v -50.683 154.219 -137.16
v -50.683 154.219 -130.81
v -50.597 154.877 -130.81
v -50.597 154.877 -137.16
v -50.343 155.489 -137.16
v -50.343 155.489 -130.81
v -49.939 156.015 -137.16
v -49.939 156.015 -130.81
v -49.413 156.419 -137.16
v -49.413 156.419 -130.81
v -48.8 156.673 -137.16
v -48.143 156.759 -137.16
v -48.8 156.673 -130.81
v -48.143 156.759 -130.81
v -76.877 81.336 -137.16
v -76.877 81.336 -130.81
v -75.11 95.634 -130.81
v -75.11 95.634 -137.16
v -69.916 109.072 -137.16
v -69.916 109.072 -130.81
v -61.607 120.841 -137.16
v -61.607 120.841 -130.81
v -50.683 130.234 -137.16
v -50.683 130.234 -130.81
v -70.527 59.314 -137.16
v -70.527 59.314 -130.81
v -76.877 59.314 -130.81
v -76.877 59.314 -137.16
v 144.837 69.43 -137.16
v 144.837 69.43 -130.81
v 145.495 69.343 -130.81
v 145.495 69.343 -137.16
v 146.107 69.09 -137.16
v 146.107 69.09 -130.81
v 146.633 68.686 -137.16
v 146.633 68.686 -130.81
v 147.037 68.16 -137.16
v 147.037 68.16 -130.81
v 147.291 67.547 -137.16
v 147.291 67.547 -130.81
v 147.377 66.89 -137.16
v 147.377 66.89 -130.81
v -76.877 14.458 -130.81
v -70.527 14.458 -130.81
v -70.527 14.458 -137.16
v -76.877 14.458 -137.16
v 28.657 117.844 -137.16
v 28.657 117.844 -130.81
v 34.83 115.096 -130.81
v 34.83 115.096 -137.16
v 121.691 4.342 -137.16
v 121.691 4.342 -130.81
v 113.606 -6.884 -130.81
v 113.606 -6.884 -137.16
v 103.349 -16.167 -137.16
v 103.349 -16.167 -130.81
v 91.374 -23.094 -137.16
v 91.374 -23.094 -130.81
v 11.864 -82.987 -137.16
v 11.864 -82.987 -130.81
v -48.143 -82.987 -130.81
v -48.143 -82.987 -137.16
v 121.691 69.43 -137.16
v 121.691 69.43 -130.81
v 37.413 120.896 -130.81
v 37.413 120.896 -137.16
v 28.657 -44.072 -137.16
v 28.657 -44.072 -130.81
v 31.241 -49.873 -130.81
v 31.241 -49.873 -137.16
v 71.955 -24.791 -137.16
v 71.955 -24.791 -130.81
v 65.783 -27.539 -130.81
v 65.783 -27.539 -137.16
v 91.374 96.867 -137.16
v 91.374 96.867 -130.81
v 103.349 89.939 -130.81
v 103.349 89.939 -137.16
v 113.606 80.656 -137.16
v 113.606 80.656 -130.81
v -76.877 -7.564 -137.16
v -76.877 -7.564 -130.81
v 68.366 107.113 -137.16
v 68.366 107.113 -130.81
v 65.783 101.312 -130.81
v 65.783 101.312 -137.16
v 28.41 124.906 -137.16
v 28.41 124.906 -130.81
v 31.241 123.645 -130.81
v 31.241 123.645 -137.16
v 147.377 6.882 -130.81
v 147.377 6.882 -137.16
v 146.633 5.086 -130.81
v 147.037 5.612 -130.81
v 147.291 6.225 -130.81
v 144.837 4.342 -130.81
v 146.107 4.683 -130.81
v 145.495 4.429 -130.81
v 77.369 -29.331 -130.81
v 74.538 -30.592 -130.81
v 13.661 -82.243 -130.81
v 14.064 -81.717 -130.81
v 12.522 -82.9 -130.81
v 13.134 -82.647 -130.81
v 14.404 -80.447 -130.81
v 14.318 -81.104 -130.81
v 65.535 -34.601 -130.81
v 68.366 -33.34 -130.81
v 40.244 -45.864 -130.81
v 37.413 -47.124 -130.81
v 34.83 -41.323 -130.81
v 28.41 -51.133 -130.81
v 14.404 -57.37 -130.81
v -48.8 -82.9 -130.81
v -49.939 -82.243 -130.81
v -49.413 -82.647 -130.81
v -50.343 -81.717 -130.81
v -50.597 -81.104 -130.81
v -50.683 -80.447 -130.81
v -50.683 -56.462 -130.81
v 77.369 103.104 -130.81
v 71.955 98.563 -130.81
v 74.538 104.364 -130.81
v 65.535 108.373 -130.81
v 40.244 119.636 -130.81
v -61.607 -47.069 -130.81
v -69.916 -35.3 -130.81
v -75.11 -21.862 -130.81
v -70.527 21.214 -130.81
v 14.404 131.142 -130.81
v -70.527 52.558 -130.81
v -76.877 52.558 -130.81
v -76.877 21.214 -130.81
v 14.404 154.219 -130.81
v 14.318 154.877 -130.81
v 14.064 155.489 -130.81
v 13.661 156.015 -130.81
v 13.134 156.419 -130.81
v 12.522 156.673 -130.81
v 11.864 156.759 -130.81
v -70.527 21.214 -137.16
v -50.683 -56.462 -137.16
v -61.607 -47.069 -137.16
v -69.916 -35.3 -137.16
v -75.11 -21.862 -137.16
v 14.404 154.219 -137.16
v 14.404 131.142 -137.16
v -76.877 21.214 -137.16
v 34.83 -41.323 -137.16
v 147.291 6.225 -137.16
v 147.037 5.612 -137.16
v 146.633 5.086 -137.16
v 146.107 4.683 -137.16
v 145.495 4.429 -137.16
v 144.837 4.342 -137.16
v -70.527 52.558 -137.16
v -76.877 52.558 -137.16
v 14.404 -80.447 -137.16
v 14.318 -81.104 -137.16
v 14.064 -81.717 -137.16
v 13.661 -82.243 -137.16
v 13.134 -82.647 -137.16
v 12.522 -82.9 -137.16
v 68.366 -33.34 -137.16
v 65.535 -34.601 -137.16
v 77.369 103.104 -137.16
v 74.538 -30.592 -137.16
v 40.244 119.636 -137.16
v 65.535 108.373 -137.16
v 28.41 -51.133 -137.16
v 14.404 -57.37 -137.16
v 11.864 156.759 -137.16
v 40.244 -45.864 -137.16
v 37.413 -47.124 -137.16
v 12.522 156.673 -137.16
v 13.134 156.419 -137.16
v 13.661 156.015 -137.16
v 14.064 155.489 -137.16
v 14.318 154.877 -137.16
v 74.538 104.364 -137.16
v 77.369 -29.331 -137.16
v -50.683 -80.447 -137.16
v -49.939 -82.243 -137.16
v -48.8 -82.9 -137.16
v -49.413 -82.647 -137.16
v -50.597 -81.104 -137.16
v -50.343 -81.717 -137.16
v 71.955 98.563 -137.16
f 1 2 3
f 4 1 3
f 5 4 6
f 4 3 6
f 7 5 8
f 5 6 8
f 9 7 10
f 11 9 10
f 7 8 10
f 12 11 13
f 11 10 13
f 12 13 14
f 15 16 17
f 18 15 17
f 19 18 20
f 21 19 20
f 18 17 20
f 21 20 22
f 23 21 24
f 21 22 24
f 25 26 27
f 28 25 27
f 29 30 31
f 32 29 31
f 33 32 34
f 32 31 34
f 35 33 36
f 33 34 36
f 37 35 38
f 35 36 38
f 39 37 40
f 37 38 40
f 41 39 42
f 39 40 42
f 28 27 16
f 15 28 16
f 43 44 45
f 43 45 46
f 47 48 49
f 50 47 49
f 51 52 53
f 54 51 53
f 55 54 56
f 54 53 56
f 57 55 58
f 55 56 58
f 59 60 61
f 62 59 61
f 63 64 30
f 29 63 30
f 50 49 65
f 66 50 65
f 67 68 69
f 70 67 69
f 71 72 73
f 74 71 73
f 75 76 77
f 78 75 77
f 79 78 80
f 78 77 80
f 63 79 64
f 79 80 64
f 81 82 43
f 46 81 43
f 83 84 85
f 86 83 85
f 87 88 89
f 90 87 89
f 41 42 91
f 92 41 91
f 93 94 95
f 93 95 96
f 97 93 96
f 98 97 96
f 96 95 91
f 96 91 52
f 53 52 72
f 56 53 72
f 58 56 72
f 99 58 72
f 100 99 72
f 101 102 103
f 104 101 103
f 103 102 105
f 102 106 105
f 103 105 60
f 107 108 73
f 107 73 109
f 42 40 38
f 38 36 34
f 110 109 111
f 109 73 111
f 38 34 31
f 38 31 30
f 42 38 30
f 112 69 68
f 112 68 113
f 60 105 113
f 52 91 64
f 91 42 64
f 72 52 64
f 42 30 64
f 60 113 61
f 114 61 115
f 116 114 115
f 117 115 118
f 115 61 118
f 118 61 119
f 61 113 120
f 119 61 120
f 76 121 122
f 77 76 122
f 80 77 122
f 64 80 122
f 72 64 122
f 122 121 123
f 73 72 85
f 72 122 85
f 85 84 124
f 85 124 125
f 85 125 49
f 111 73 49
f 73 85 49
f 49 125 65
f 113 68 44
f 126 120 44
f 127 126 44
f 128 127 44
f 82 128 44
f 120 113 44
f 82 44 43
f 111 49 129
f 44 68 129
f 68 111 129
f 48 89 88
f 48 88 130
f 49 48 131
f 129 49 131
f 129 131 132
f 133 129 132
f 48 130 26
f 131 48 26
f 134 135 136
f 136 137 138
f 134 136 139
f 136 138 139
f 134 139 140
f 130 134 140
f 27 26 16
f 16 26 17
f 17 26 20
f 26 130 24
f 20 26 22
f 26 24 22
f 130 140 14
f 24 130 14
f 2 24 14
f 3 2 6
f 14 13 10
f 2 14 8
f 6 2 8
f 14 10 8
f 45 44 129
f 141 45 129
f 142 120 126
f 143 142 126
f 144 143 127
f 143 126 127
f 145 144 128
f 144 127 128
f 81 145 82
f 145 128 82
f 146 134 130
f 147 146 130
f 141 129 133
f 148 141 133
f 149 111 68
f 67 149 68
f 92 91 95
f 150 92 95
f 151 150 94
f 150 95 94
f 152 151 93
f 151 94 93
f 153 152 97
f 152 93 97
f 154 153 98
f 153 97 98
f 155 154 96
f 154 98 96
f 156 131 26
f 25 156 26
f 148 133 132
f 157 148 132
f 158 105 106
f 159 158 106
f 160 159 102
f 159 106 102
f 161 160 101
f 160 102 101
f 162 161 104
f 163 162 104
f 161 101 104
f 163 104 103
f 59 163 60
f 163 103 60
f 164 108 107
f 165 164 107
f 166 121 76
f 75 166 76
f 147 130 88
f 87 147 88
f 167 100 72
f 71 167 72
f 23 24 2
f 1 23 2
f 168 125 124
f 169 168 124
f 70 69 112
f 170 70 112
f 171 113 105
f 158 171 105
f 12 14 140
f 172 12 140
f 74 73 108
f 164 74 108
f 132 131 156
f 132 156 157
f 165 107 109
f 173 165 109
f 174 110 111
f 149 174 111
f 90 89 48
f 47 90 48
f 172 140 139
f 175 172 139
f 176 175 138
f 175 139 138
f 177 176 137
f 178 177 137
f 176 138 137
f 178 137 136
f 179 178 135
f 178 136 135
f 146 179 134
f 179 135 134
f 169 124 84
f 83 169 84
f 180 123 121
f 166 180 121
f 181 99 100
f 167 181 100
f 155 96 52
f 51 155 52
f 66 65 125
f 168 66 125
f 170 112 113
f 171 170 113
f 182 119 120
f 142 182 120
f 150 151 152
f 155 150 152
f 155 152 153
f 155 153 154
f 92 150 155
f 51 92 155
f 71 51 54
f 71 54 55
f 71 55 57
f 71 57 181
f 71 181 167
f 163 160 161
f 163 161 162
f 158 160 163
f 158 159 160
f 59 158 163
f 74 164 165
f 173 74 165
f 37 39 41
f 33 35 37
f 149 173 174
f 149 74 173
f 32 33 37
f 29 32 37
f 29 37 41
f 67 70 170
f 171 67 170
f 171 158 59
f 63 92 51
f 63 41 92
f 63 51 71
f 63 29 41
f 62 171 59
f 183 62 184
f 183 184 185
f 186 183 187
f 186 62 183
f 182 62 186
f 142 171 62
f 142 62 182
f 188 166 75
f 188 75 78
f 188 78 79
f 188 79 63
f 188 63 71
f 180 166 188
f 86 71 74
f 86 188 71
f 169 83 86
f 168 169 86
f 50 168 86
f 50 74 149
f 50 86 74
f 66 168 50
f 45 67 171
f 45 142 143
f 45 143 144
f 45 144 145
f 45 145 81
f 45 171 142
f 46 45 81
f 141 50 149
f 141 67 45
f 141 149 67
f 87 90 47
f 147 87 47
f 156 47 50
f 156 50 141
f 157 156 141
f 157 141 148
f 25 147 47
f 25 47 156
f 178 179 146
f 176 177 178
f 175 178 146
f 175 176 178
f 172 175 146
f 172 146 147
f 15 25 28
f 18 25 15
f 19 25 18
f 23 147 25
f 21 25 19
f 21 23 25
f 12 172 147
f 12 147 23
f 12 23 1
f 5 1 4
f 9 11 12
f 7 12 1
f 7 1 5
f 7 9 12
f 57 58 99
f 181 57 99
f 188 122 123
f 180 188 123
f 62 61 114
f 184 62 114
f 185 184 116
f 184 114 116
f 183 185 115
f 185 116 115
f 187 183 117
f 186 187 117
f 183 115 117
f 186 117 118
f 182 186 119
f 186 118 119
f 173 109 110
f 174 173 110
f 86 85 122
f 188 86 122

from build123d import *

# Parameters (mm, degrees)
SKETCH1_W           = 6.35
SKETCH1_H           = 3.0988
SKETCH1_H_2         = 25.146
BOSS_EXTRUDE1_DEPTH = 6.35


with BuildPart() as part:
    # Sketch1 → Boss-Extrude1 (new body)
    with BuildSketch(Plane(origin=(0, 0, -130.81), x_dir=(-1, 0, 0), z_dir=(0, 0, -1))):
        with BuildLine():
            Line((70.526798569, 59.314378099), (70.526798569, 62.413178099))
            Line((70.526798569, 62.413178099), (70.526798569, 81.336178099))
            ThreePointArc((70.526798569, 81.336178099), (63.856531257, 106.917123969), (45.544320246, 125.983853774))
            ThreePointArc((45.544320246, 125.983853774), (44.656455469, 126.90830128), (44.333048569, 128.148589564))
            Line((44.333048569, 128.148589564), (44.333048569, 147.869312576))
            ThreePointArc((44.333048569, 147.869312576), (43.589099793, 149.6653638), (41.793048569, 150.409312576))
            Line((41.793048569, 150.409312576), (-5.514451431, 150.409312576))
            ThreePointArc((-5.514451431, 150.409312576), (-7.310502655, 149.6653638), (-8.054451431, 147.869312576))
            Line((-8.054451431, 147.869312576), (-8.054451431, 128.668205083))
            ThreePointArc((-8.054451431, 128.668205083), (-8.464181451, 127.284893905), (-9.561183568, 126.347869434))
            Line((-9.561183568, 126.347869434), (-25.826658021, 119.104696647))
            Line((-25.826658021, 119.104696647), (-28.657467512, 117.844109854))
            Line((-28.657467512, 117.844109854), (-34.829560338, 115.095617339))
            Line((-34.829560338, 115.095617339), (-37.66036983, 113.835030546))
            Line((-37.66036983, 113.835030546), (-62.952028403, 102.57241084))
            Line((-62.952028403, 102.57241084), (-65.782837894, 101.311824047))
            Line((-65.782837894, 101.311824047), (-71.95493072, 98.563331532))
            Line((-71.95493072, 98.563331532), (-74.785740212, 97.302744739))
            Line((-74.785740212, 97.302744739), (-88.791116459, 91.0660155))
            ThreePointArc((-88.791116459, 91.0660155), (-105.234258555, 80.148597196), (-117.184308425, 64.439897298))
            ThreePointArc((-117.184308425, 64.439897298), (-118.119343883, 63.446350606), (-119.433558814, 63.079928099))
            Line((-119.433558814, 63.079928099), (-138.48728746, 63.079928099))
            ThreePointArc((-138.48728746, 63.079928099), (-140.283338684, 62.335979323), (-141.02728746, 60.539928099))
            Line((-141.02728746, 60.539928099), (-141.02728746, 13.232428099))
            ThreePointArc((-141.02728746, 13.232428099), (-140.283338684, 11.436376875), (-138.48728746, 10.692428099))
            Line((-138.48728746, 10.692428099), (-119.433558814, 10.692428099))
            ThreePointArc((-119.433558814, 10.692428099), (-118.119343883, 10.326005592), (-117.184308425, 9.3324589))
            ThreePointArc((-117.184308425, 9.3324589), (-105.234258555, -6.376240998), (-88.791116459, -17.293659302))
            Line((-88.791116459, -17.293659302), (-74.785740212, -23.530388541))
            Line((-74.785740212, -23.530388541), (-71.95493072, -24.790975333))
            Line((-71.95493072, -24.790975333), (-65.782837894, -27.539467849))
            Line((-65.782837894, -27.539467849), (-62.952028403, -28.800054642))
            Line((-62.952028403, -28.800054642), (-37.66036983, -40.062674348))
            Line((-37.66036983, -40.062674348), (-34.829560338, -41.323261141))
            Line((-34.829560338, -41.323261141), (-28.657467512, -44.071753656))
            Line((-28.657467512, -44.071753656), (-25.826658021, -45.332340449))
            Line((-25.826658021, -45.332340449), (-9.561183568, -52.575513236))
            ThreePointArc((-9.561183568, -52.575513236), (-8.464181451, -53.512537707), (-8.054451431, -54.895848885))
            Line((-8.054451431, -54.895848885), (-8.054451431, -76.636956378))
            Line((-8.054451431, -76.636956378), (44.333048569, -76.636956378))
            Line((44.333048569, -76.636956378), (44.333048569, -54.376233366))
            ThreePointArc((44.333048569, -54.376233366), (44.656455469, -53.135945082), (45.544320246, -52.211497576))
            ThreePointArc((45.544320246, -52.211497576), (63.856531257, -33.144767771), (70.526798569, -7.563821901))
            Line((70.526798569, -7.563821901), (70.526798569, 11.359178099))
            Line((70.526798569, 11.359178099), (70.526798569, 14.457978099))
            Line((70.526798569, 14.457978099), (70.526798569, 21.214378099))
            Line((70.526798569, 21.214378099), (70.526798569, 24.313178099))
            Line((70.526798569, 24.313178099), (70.526798569, 49.459178099))
            Line((70.526798569, 49.459178099), (70.526798569, 52.557978099))
            Line((70.526798569, 52.557978099), (70.526798569, 59.314378099))
        make_face()
        with Locations((73.701798569, 60.863778099)):
            Rectangle(SKETCH1_W, SKETCH1_H)
        with BuildLine():
            Line((70.526798569, 81.336178099), (70.526798569, 62.413178099))
            Line((70.526798569, 62.413178099), (76.876798569, 62.413178099))
            Line((76.876798569, 62.413178099), (76.876798569, 81.336178099))
            ThreePointArc((76.876798569, 81.336178099), (69.915897636, 109.072033869), (50.683048569, 130.234012838))
            Line((50.683048569, 130.234012838), (50.683048569, 154.219312576))
            ThreePointArc((50.683048569, 154.219312576), (49.939099793, 156.0153638), (48.143048569, 156.759312576))
            Line((48.143048569, 156.759312576), (-11.864451431, 156.759312576))
            ThreePointArc((-11.864451431, 156.759312576), (-13.660502655, 156.0153638), (-14.404451431, 154.219312576))
            Line((-14.404451431, 154.219312576), (-14.404451431, 131.142265008))
            Line((-14.404451431, 131.142265008), (-28.409827678, 124.905535769))
            Line((-28.409827678, 124.905535769), (-25.826658021, 119.104696647))
            Line((-25.826658021, 119.104696647), (-9.561183568, 126.347869434))
            ThreePointArc((-9.561183568, 126.347869434), (-8.464181451, 127.284893905), (-8.054451431, 128.668205083))
            Line((-8.054451431, 128.668205083), (-8.054451431, 147.869312576))
            ThreePointArc((-8.054451431, 147.869312576), (-7.310502655, 149.6653638), (-5.514451431, 150.409312576))
            Line((-5.514451431, 150.409312576), (41.793048569, 150.409312576))
            ThreePointArc((41.793048569, 150.409312576), (43.589099793, 149.6653638), (44.333048569, 147.869312576))
            Line((44.333048569, 147.869312576), (44.333048569, 128.148589564))
            ThreePointArc((44.333048569, 128.148589564), (44.656455469, 126.90830128), (45.544320246, 125.983853774))
            ThreePointArc((45.544320246, 125.983853774), (63.856531257, 106.917123969), (70.526798569, 81.336178099))
        make_face()
        with Locations((73.701798569, 51.008578099)):
            Rectangle(SKETCH1_W, SKETCH1_H)
        with Locations((73.701798569, 36.886178099)):
            Rectangle(SKETCH1_W, SKETCH1_H_2)
        with Locations((73.701798569, 22.763778099)):
            Rectangle(SKETCH1_W, SKETCH1_H)
        with Locations((73.701798569, 12.908578099)):
            Rectangle(SKETCH1_W, SKETCH1_H)
        with BuildLine():
            Line((76.876798569, 11.359178099), (70.526798569, 11.359178099))
            Line((70.526798569, 11.359178099), (70.526798569, -7.563821901))
            ThreePointArc((70.526798569, -7.563821901), (63.856531257, -33.144767771), (45.544320246, -52.211497576))
            ThreePointArc((45.544320246, -52.211497576), (44.656455469, -53.135945082), (44.333048569, -54.376233366))
            Line((44.333048569, -54.376233366), (44.333048569, -76.636956378))
            Line((44.333048569, -76.636956378), (-8.054451431, -76.636956378))
            Line((-8.054451431, -76.636956378), (-8.054451431, -54.895848885))
            ThreePointArc((-8.054451431, -54.895848885), (-8.464181451, -53.512537707), (-9.561183568, -52.575513236))
            Line((-9.561183568, -52.575513236), (-25.826658021, -45.332340449))
            Line((-25.826658021, -45.332340449), (-28.409827678, -51.133179571))
            Line((-28.409827678, -51.133179571), (-14.404451431, -57.36990881))
            Line((-14.404451431, -57.36990881), (-14.404451431, -80.446956378))
            ThreePointArc((-14.404451431, -80.446956378), (-13.660502655, -82.243007602), (-11.864451431, -82.986956378))
            Line((-11.864451431, -82.986956378), (48.143048569, -82.986956378))
            ThreePointArc((48.143048569, -82.986956378), (49.939099793, -82.243007602), (50.683048569, -80.446956378))
            Line((50.683048569, -80.446956378), (50.683048569, -56.46165664))
            ThreePointArc((50.683048569, -56.46165664), (69.915897636, -35.299677671), (76.876798569, -7.563821901))
            Line((76.876798569, -7.563821901), (76.876798569, 11.359178099))
        make_face()
        Polygon((-28.409827678, -51.133179571), (-25.826658021, -45.332340449), (-28.657467512, -44.071753656), (-31.24063717, -49.872592778), align=None)
        Polygon((-37.412729996, -47.124100263), (-34.829560338, -41.323261141), (-37.66036983, -40.062674348), (-40.243539487, -45.86351347), align=None)
        Polygon((-40.243539487, -45.86351347), (-37.66036983, -40.062674348), (-62.952028403, -28.800054642), (-65.53519806, -34.600893764), align=None)
        Polygon((-65.53519806, -34.600893764), (-62.952028403, -28.800054642), (-65.782837894, -27.539467849), (-68.366007552, -33.340306971), align=None)
        with BuildLine():
            Line((-74.785740212, 97.302744739), (-77.368909869, 103.103583861))
            Line((-77.368909869, 103.103583861), (-91.374286117, 96.866854622))
            ThreePointArc((-91.374286117, 96.866854622), (-108.722690302, 85.568449718), (-121.690697129, 69.429928099))
            Line((-121.690697129, 69.429928099), (-144.83728746, 69.429928099))
            ThreePointArc((-144.83728746, 69.429928099), (-146.633338684, 68.685979323), (-147.37728746, 66.889928099))
            Line((-147.37728746, 66.889928099), (-147.37728746, 6.882428099))
            ThreePointArc((-147.37728746, 6.882428099), (-146.633338684, 5.086376875), (-144.83728746, 4.342428099))
            Line((-144.83728746, 4.342428099), (-121.690697129, 4.342428099))
            ThreePointArc((-121.690697129, 4.342428099), (-108.722690302, -11.79609352), (-91.374286117, -23.094498424))
            Line((-91.374286117, -23.094498424), (-77.368909869, -29.331227663))
            Line((-77.368909869, -29.331227663), (-74.785740212, -23.530388541))
            Line((-74.785740212, -23.530388541), (-88.791116459, -17.293659302))
            ThreePointArc((-88.791116459, -17.293659302), (-105.234258555, -6.376240998), (-117.184308425, 9.3324589))
            ThreePointArc((-117.184308425, 9.3324589), (-118.119343883, 10.326005592), (-119.433558814, 10.692428099))
            Line((-119.433558814, 10.692428099), (-138.48728746, 10.692428099))
            ThreePointArc((-138.48728746, 10.692428099), (-140.283338684, 11.436376875), (-141.02728746, 13.232428099))
            Line((-141.02728746, 13.232428099), (-141.02728746, 60.539928099))
            ThreePointArc((-141.02728746, 60.539928099), (-140.283338684, 62.335979323), (-138.48728746, 63.079928099))
            Line((-138.48728746, 63.079928099), (-119.433558814, 63.079928099))
            ThreePointArc((-119.433558814, 63.079928099), (-118.119343883, 63.446350606), (-117.184308425, 64.439897298))
            ThreePointArc((-117.184308425, 64.439897298), (-105.234258555, 80.148597196), (-88.791116459, 91.0660155))
            Line((-88.791116459, 91.0660155), (-74.785740212, 97.302744739))
        make_face()
        Polygon((-74.538100378, -30.591814456), (-71.95493072, -24.790975333), (-74.785740212, -23.530388541), (-77.368909869, -29.331227663), align=None)
        Polygon((-37.66036983, 113.835030546), (-40.243539487, 119.635869668), (-65.53519806, 108.373249962), (-62.952028403, 102.57241084), align=None)
        Polygon((-34.829560338, 115.095617339), (-37.412729996, 120.896456461), (-40.243539487, 119.635869668), (-37.66036983, 113.835030546), align=None)
        Polygon((-25.826658021, 119.104696647), (-28.409827678, 124.905535769), (-31.24063717, 123.644948976), (-28.657467512, 117.844109854), align=None)
        Polygon((-62.952028403, 102.57241084), (-65.53519806, 108.373249962), (-68.366007552, 107.112663169), (-65.782837894, 101.311824047), align=None)
        Polygon((-71.95493072, 98.563331532), (-74.538100378, 104.364170654), (-77.368909869, 103.103583861), (-74.785740212, 97.302744739), align=None)
    extrude(amount=BOSS_EXTRUDE1_DEPTH)


solid = part.part
